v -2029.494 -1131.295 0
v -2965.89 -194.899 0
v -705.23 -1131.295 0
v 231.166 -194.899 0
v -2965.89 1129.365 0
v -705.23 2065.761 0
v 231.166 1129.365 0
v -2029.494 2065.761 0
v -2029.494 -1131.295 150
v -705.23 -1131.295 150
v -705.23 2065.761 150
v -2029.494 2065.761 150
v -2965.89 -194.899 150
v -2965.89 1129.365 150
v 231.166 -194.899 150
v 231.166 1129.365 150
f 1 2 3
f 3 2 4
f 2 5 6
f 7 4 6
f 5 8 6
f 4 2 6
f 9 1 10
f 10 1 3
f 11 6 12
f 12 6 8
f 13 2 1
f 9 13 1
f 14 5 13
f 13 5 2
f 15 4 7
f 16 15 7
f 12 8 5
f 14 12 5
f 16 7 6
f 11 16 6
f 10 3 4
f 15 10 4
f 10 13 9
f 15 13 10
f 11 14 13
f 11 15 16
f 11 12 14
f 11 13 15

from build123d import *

# Parameters (mm, degrees)
F1_DEPTH = 150


with BuildPart() as f1:
    # F0 (on Top) → F1 (new body)
    with BuildSketch(Plane.XY):
        Polygon((-2965.890262, 1129.365108), (-2965.890262, -194.898961), (-2029.494159, -1131.295064), (-705.23009, -1131.295064), (231.166013, -194.898961), (231.166013, 1129.365108), (-705.23009, 2065.761211), (-2029.494159, 2065.761211), align=None)
        Polygon((81.166013, 1067.233074), (81.166013, -132.766926), (-767.362124, -981.295064), (-1967.362124, -981.295064), (-2815.890262, -132.766926), (-2815.890262, 1067.233074), (-1967.362124, 1915.761211), (-767.362124, 1915.761211), align=None, mode=Mode.SUBTRACT)
        Polygon((-767.362124, -981.295064), (81.166013, -132.766926), (81.166013, 1067.233074), (-767.362124, 1915.761211), (-1967.362124, 1915.761211), (-2815.890262, 1067.233074), (-2815.890262, -132.766926), (-1967.362124, -981.295064), align=None)
    extrude(amount=F1_DEPTH)


solid = f1.part
